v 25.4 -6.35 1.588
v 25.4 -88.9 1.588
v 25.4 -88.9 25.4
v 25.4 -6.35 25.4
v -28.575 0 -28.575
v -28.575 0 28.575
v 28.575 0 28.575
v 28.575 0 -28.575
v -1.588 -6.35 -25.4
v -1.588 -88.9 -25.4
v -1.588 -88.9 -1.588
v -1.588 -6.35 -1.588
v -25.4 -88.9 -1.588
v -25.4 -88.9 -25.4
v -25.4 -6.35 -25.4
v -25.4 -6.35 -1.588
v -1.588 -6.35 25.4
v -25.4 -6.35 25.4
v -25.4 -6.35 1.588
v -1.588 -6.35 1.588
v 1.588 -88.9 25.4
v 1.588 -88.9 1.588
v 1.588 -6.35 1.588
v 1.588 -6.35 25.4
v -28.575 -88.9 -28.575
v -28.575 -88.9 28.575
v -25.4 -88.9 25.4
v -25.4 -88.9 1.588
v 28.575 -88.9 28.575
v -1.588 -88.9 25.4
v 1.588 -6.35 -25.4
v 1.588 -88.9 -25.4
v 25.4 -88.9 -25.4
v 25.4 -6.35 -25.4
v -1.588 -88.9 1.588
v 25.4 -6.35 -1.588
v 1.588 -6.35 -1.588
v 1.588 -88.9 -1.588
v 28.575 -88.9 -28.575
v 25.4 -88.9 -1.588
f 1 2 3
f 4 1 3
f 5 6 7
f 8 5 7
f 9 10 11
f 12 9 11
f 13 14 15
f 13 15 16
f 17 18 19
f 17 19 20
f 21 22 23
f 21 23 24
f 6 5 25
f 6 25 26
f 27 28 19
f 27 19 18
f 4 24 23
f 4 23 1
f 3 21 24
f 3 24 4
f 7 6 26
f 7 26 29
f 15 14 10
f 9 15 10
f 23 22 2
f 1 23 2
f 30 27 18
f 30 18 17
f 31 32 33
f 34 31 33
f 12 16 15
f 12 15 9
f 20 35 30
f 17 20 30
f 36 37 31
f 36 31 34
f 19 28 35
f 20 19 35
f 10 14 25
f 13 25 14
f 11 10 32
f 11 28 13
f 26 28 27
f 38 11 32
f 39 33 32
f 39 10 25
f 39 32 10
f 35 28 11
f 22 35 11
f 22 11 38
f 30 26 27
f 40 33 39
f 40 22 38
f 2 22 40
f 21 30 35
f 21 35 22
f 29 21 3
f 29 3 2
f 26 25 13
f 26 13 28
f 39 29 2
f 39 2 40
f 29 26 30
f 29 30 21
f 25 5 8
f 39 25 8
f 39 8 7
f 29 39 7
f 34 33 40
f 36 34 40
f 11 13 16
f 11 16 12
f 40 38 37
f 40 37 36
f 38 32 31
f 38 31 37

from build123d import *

# Parameters (mm, degrees)
F0_W     = 57.15
F0_H     = 57.15
F1_DEPTH = 88.9
F2_W     = 23.8125
F2_H     = 23.8125
F3_DEPTH = 82.55
F4_W     = 23.8125
F4_H     = 23.8125
F5_DEPTH = 82.55
F6_W     = 23.8125
F6_H     = 23.8125
F7_DEPTH = 82.55
F8_W     = 23.8125
F8_H     = 23.8125
F9_DEPTH = 82.55


with BuildPart() as f1:
    # F0 (on Front) → F1 (new body)
    with BuildSketch(Plane.XZ):
        Rectangle(F0_W, F0_H)
    extrude(amount=F1_DEPTH)

    # F2 (on face) → F3 (cut)
    with BuildSketch(Plane.XZ.offset(88.9)):
        with Locations((-13.49375, 13.49375)):
            Rectangle(F2_W, F2_H)
    extrude(amount=-F3_DEPTH, mode=Mode.SUBTRACT)

    # F4 (on face) → F5 (cut)
    with BuildSketch(Plane.XZ.offset(88.9)):
        with Locations((13.49375, 13.49375)):
            Rectangle(F4_W, F4_H)
    extrude(amount=-F5_DEPTH, mode=Mode.SUBTRACT)

    # F6 (on face) → F7 (cut)
    with BuildSketch(Plane.XZ.offset(88.9)):
        with Locations((-13.49375, -13.49375)):
            Rectangle(F6_W, F6_H)
    extrude(amount=-F7_DEPTH, mode=Mode.SUBTRACT)

    # F8 (on face) → F9 (cut)
    with BuildSketch(Plane.XZ.offset(88.9)):
        with Locations((13.49375, -13.49375)):
            Rectangle(F8_W, F8_H)
    extrude(amount=-F9_DEPTH, mode=Mode.SUBTRACT)


solid = f1.part
